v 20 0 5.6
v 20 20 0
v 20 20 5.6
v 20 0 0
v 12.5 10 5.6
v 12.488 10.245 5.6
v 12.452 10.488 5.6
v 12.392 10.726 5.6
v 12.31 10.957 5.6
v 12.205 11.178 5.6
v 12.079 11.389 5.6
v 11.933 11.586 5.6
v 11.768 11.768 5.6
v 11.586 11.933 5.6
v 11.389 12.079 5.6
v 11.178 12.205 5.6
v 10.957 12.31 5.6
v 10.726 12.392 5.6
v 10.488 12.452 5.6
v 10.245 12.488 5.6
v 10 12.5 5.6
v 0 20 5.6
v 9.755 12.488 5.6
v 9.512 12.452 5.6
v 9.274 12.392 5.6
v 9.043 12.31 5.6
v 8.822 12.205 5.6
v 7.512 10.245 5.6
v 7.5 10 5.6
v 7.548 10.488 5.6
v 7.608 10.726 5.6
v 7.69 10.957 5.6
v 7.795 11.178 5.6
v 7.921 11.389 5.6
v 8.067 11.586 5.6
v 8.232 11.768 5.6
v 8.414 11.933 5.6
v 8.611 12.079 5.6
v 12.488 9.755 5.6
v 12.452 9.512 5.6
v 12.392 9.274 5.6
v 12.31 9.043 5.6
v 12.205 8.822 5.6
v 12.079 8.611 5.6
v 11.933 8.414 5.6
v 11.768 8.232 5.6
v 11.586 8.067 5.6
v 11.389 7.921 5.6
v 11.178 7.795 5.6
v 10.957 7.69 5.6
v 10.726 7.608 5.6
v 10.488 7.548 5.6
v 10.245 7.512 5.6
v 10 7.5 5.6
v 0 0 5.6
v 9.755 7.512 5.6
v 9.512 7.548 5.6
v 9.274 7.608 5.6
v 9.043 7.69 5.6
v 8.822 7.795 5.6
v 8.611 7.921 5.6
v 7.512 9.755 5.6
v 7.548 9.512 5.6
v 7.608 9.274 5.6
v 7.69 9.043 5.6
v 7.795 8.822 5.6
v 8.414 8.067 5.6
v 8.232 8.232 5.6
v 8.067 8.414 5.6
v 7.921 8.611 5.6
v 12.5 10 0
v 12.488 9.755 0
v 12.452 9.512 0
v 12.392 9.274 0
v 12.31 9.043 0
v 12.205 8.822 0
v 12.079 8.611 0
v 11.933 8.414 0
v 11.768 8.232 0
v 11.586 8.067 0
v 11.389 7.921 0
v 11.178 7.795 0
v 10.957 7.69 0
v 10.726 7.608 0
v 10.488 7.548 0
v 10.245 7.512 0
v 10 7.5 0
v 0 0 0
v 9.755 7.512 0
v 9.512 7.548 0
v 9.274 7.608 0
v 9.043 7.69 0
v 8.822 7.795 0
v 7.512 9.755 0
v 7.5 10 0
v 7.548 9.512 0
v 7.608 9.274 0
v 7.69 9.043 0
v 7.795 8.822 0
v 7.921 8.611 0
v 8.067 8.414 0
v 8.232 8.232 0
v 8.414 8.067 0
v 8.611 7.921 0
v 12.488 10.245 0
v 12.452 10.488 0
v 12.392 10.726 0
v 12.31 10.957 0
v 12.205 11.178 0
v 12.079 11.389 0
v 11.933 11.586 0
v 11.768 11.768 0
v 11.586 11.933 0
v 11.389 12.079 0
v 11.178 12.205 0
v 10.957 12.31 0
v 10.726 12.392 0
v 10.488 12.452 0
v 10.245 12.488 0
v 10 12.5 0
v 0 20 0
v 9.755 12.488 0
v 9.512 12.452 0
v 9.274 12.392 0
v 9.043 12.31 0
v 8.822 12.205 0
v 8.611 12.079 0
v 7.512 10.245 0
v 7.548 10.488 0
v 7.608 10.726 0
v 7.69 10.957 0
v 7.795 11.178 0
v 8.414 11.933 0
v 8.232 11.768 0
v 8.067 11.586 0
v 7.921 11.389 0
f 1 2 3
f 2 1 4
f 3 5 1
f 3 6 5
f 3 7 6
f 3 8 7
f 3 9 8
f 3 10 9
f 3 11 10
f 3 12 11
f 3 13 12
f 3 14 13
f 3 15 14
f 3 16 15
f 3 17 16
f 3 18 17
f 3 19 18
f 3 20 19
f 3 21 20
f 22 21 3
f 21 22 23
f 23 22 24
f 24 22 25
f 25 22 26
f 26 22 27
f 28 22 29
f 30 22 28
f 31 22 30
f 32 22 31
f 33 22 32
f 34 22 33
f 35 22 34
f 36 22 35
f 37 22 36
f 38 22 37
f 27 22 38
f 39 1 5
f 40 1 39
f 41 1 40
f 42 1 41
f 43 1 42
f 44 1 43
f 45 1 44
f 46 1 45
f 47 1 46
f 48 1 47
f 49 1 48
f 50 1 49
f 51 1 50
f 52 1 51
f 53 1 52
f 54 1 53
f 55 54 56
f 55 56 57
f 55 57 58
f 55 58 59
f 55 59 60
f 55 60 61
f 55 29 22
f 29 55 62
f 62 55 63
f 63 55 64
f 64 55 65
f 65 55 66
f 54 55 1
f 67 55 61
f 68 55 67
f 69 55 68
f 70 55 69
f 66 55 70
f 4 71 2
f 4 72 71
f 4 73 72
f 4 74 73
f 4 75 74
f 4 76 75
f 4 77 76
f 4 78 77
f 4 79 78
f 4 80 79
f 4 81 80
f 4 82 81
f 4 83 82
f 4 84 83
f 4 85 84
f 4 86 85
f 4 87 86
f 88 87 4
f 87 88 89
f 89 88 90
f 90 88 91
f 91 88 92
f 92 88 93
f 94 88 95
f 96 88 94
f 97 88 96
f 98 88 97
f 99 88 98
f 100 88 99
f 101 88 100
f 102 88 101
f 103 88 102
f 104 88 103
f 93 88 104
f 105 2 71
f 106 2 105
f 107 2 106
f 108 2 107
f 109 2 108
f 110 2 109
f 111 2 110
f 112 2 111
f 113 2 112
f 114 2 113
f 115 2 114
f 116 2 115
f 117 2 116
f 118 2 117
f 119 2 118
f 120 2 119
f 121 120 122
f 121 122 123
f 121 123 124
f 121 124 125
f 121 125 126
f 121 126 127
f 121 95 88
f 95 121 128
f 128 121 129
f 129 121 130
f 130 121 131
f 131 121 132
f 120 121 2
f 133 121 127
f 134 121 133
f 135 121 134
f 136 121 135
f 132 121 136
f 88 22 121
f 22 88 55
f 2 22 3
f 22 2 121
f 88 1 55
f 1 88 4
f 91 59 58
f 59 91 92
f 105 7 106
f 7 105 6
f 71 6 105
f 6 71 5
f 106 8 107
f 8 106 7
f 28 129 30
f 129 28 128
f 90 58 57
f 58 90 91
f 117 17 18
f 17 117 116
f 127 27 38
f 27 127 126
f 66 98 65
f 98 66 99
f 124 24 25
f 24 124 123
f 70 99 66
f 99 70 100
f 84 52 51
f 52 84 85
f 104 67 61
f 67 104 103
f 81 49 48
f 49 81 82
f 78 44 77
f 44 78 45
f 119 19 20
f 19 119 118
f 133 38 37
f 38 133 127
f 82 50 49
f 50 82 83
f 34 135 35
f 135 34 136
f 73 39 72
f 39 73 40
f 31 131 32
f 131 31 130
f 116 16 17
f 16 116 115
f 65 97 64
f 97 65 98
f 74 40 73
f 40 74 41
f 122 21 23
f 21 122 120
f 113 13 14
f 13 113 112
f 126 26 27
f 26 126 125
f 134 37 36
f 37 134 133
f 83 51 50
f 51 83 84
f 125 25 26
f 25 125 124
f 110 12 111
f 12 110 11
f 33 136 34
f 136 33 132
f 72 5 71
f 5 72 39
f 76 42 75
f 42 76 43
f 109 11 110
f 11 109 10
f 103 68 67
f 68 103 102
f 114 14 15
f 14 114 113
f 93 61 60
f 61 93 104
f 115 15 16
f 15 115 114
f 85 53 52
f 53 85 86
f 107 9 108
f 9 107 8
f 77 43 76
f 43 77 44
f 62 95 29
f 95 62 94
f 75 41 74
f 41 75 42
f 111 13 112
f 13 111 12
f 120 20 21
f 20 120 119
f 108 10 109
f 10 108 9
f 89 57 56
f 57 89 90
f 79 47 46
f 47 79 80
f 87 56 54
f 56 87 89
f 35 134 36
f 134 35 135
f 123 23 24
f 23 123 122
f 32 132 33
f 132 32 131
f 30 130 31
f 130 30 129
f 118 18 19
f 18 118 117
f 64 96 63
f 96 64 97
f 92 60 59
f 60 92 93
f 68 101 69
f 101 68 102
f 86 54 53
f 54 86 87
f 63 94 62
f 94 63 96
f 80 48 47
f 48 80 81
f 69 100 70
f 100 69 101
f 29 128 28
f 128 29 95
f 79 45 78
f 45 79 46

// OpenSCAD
// Fixture: remaining unprinted upper (cut-plane mate)
// Printed stump below current_z is NOT in this mesh and cannot be reshaped.
// z=0 is the cut plane — this solid mates with the stump and prints as remaining layers.
$fn = 64;
current_z = 2.4;
remaining_h = 5.6;
size_x = 20;
size_y = 20;
hole_d = 5;

difference() {
  cube([size_x, size_y, remaining_h], center = false);
  translate([size_x / 2, size_y / 2, -1])
    cylinder(h = remaining_h + 2, d = hole_d);
}
